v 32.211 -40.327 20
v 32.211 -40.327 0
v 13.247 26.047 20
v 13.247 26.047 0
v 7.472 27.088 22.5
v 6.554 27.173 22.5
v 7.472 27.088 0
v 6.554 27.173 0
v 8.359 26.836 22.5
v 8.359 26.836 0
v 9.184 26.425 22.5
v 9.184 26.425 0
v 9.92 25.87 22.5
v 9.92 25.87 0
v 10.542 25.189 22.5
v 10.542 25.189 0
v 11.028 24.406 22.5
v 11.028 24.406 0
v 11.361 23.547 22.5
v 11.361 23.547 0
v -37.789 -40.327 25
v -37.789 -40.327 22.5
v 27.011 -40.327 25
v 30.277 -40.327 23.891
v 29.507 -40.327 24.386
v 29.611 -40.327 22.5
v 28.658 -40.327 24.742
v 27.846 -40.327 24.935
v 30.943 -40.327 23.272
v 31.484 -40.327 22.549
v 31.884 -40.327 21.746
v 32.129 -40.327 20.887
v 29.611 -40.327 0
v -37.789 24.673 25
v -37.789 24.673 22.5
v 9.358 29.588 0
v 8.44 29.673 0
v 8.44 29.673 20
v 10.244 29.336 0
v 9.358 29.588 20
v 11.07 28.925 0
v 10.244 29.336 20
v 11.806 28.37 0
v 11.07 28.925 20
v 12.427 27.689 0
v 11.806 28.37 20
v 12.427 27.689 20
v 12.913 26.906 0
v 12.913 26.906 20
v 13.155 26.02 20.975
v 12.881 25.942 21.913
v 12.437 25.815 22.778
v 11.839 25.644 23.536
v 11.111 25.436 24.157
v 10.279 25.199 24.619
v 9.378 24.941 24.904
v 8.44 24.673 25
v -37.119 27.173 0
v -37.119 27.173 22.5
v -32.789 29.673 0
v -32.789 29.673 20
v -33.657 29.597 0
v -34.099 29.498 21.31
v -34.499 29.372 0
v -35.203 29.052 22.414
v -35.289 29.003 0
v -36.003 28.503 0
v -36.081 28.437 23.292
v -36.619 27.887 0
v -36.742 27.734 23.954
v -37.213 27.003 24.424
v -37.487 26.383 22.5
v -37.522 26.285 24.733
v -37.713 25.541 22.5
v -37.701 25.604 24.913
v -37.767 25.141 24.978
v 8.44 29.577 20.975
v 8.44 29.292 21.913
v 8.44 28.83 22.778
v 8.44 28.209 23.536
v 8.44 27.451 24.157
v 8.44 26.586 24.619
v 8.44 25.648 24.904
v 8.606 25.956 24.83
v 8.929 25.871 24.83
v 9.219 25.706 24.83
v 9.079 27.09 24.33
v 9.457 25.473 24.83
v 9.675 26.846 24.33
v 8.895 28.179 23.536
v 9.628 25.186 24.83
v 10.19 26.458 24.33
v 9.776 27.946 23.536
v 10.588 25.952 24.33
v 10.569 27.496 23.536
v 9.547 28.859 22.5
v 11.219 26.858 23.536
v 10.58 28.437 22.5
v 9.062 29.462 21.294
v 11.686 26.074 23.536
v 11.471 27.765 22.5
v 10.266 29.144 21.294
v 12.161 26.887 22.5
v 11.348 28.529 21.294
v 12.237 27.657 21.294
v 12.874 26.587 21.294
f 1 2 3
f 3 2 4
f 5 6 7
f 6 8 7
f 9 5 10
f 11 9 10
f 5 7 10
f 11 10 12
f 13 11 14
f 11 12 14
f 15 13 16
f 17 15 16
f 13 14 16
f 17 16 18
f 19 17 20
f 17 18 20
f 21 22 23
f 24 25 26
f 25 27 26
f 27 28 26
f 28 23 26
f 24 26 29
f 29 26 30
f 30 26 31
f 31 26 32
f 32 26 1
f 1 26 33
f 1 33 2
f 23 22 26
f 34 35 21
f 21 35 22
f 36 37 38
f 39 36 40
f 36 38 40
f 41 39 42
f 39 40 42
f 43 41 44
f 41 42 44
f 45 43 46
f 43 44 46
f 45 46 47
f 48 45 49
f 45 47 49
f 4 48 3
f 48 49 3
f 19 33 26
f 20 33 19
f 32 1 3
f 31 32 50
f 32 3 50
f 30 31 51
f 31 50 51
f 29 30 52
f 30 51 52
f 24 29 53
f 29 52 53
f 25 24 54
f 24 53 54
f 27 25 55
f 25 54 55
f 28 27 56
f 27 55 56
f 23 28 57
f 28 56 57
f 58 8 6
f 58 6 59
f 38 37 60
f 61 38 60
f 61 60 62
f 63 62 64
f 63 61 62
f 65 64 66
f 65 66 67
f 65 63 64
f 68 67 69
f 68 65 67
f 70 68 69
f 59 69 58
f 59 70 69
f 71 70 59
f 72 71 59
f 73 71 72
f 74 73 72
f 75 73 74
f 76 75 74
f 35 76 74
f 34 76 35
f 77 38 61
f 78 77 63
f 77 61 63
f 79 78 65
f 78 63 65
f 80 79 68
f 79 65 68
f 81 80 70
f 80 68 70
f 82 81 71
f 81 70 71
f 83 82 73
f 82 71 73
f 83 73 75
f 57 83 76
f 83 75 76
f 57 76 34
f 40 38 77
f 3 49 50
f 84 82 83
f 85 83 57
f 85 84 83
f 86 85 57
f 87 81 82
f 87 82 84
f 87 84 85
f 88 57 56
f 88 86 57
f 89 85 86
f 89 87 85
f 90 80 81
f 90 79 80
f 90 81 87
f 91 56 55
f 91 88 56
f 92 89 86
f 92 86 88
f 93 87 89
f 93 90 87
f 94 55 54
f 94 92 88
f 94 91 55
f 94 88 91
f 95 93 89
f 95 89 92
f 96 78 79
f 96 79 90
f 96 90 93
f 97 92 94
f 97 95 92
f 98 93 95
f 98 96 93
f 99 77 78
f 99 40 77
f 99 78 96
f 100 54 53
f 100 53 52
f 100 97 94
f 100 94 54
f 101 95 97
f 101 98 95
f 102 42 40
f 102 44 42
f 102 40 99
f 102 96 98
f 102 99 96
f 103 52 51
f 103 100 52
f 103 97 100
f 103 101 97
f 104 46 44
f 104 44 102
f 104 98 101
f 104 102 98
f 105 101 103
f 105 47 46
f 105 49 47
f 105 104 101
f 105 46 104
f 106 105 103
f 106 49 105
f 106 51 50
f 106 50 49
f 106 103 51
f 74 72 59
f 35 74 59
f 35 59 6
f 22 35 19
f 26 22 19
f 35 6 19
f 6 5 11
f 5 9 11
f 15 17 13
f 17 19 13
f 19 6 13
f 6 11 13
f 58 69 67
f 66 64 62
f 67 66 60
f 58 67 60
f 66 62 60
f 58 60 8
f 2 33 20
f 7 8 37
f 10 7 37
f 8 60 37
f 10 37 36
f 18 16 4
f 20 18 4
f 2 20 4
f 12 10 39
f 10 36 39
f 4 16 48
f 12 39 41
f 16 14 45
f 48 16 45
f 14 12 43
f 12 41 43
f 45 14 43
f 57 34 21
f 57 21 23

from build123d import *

# Parameters (mm, degrees)
F1_DEPTH = 25
F2_T     = -2.5
F3_R     = 5


with BuildPart() as f1:
    # F0 (on Top) → F1 (new body)
    with BuildSketch(Plane.XY):
        Polygon((12.2111159576, 29.6730460864), (-37.7888840424, 29.6730460864), (-37.7888840424, -40.3269539136), (32.2111159576, -40.3269539136), align=None)
    extrude(amount=F1_DEPTH)

    # F2
    f2_openings = [f1.faces().sort_by_distance(p)[0] for p in [
        (-37.788884, -5.326954, 12.5),
        (-7.511106, -7.271398, 0),
        (-2.788884, -40.326954, 12.5),
    ]]
    offset(amount=F2_T, openings=f2_openings)

    # F3
    f3_edges = [f1.edges().sort_by_distance(p)[0] for p in [
        (12.211116, 29.673046, 12.5),
        (10.325362, 27.173046, 11.25),
        (-12.788884, 29.673046, 25),
        (22.211116, -5.326954, 25),
        (-37.788884, 29.673046, 12.5),
    ]]
    fillet(f3_edges, radius=F3_R)


solid = f1.part
